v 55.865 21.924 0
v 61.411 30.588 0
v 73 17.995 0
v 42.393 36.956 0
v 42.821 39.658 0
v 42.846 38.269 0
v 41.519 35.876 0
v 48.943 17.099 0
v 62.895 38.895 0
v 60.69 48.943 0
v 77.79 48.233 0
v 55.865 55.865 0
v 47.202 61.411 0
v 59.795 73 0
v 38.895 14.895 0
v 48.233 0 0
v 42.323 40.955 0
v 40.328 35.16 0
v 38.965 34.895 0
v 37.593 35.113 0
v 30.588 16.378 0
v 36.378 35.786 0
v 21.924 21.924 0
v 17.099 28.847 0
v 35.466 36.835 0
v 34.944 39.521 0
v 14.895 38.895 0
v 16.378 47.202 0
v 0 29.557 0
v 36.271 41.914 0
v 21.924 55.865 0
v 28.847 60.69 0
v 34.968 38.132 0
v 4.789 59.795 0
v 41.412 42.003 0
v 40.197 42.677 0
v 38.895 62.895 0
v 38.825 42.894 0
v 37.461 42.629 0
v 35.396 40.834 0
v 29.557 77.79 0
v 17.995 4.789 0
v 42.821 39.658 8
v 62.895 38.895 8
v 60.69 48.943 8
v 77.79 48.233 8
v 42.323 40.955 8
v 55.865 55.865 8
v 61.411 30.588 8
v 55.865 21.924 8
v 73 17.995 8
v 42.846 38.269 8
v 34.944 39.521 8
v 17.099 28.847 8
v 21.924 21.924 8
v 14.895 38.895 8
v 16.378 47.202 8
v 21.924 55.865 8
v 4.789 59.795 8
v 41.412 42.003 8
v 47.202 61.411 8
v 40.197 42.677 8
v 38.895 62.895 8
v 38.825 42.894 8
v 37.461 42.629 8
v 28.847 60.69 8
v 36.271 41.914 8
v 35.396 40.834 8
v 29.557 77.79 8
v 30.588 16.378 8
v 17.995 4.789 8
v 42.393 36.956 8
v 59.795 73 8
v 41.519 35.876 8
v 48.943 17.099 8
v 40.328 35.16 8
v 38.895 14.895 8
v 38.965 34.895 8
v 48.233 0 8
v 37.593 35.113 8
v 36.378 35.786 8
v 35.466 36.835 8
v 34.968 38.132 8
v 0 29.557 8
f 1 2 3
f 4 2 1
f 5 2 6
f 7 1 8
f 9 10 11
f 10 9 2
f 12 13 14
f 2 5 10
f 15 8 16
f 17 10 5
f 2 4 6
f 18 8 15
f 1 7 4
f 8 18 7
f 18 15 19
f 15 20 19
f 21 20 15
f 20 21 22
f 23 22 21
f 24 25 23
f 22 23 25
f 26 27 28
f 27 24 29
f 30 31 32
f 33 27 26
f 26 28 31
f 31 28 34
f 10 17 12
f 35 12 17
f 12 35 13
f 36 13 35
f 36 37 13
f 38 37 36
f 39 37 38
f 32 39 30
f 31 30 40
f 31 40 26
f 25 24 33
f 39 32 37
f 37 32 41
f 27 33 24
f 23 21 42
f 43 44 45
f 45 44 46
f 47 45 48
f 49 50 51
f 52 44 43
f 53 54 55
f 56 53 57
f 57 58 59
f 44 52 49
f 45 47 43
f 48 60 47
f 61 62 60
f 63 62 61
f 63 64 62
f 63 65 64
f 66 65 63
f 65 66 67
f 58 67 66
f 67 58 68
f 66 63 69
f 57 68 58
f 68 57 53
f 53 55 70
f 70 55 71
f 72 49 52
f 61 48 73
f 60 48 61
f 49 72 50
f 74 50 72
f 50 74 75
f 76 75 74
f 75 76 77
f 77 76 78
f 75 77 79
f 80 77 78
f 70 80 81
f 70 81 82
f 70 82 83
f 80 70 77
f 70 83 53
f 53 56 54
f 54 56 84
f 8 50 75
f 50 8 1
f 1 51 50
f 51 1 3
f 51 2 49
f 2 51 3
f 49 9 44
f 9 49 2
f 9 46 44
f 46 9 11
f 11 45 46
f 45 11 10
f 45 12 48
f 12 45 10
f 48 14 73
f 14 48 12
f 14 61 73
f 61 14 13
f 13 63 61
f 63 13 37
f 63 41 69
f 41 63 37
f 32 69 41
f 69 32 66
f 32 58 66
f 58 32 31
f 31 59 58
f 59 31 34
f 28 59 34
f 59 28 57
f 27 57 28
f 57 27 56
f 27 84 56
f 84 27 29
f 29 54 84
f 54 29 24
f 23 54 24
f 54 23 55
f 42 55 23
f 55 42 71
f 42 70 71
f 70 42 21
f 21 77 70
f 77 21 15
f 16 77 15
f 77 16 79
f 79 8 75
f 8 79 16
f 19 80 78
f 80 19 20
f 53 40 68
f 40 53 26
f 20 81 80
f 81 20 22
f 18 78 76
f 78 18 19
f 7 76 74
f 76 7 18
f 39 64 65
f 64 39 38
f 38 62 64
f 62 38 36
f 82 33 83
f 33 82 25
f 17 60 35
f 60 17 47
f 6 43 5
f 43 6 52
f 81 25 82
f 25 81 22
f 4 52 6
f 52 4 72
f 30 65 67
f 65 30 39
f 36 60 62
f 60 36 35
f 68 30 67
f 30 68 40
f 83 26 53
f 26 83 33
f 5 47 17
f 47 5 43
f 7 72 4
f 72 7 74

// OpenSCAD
$fn = 32;

// ----------------------------------------------------------------------
// Star wheel: 8-point ratchet, R40
// ----------------------------------------------------------------------

// --- parameters (mm) ---
n_points = 8;             // number of points / teeth
r_out = 40;               // tip radius
r_in = 24;                // root radius
bore_r = 4;               // centre bore radius
plate_t = 8;              // plate thickness, Z (extrusion height)
bore_d = 8;               // centre bore diameter
fit_tol = 0.05;           // declared fit tolerance (prompt contract)
free_tol = 0.2;           // declared free tolerance (prompt contract)

profile = [[14.895, 38.895], [0, 29.557], [17.099, 28.847], [21.924, 21.924], [17.995, 4.789], [30.588, 16.378], [38.895, 14.895], [48.233, 0], [48.943, 17.099], [55.865, 21.924], [73, 17.995], [61.411, 30.588], [62.895, 38.895], [77.79, 48.233], [60.69, 48.943], [55.865, 55.865], [59.795, 73], [47.202, 61.411], [38.895, 62.895], [29.557, 77.79], [28.847, 60.69], [21.924, 55.865], [4.789, 59.795], [16.378, 47.202]];  // primary outline, 24 points, counter clockwise
void_1 = [[42.821, 39.658], [42.323, 40.955], [41.412, 42.003], [40.197, 42.677], [38.825, 42.894], [37.461, 42.629], [36.271, 41.914], [35.396, 40.834], [34.944, 39.521], [34.968, 38.132], [35.466, 36.835], [36.378, 35.786], [37.593, 35.113], [38.965, 34.895], [40.328, 35.16], [41.519, 35.876], [42.393, 36.956], [42.846, 38.269]];  // centre bore, 18 points

// --- the one profile operation ---
difference() {
  linear_extrude(height = plate_t) polygon(points = profile);
  translate([0, 0, -1])
    linear_extrude(height = plate_t + 2) polygon(points = void_1);
}
